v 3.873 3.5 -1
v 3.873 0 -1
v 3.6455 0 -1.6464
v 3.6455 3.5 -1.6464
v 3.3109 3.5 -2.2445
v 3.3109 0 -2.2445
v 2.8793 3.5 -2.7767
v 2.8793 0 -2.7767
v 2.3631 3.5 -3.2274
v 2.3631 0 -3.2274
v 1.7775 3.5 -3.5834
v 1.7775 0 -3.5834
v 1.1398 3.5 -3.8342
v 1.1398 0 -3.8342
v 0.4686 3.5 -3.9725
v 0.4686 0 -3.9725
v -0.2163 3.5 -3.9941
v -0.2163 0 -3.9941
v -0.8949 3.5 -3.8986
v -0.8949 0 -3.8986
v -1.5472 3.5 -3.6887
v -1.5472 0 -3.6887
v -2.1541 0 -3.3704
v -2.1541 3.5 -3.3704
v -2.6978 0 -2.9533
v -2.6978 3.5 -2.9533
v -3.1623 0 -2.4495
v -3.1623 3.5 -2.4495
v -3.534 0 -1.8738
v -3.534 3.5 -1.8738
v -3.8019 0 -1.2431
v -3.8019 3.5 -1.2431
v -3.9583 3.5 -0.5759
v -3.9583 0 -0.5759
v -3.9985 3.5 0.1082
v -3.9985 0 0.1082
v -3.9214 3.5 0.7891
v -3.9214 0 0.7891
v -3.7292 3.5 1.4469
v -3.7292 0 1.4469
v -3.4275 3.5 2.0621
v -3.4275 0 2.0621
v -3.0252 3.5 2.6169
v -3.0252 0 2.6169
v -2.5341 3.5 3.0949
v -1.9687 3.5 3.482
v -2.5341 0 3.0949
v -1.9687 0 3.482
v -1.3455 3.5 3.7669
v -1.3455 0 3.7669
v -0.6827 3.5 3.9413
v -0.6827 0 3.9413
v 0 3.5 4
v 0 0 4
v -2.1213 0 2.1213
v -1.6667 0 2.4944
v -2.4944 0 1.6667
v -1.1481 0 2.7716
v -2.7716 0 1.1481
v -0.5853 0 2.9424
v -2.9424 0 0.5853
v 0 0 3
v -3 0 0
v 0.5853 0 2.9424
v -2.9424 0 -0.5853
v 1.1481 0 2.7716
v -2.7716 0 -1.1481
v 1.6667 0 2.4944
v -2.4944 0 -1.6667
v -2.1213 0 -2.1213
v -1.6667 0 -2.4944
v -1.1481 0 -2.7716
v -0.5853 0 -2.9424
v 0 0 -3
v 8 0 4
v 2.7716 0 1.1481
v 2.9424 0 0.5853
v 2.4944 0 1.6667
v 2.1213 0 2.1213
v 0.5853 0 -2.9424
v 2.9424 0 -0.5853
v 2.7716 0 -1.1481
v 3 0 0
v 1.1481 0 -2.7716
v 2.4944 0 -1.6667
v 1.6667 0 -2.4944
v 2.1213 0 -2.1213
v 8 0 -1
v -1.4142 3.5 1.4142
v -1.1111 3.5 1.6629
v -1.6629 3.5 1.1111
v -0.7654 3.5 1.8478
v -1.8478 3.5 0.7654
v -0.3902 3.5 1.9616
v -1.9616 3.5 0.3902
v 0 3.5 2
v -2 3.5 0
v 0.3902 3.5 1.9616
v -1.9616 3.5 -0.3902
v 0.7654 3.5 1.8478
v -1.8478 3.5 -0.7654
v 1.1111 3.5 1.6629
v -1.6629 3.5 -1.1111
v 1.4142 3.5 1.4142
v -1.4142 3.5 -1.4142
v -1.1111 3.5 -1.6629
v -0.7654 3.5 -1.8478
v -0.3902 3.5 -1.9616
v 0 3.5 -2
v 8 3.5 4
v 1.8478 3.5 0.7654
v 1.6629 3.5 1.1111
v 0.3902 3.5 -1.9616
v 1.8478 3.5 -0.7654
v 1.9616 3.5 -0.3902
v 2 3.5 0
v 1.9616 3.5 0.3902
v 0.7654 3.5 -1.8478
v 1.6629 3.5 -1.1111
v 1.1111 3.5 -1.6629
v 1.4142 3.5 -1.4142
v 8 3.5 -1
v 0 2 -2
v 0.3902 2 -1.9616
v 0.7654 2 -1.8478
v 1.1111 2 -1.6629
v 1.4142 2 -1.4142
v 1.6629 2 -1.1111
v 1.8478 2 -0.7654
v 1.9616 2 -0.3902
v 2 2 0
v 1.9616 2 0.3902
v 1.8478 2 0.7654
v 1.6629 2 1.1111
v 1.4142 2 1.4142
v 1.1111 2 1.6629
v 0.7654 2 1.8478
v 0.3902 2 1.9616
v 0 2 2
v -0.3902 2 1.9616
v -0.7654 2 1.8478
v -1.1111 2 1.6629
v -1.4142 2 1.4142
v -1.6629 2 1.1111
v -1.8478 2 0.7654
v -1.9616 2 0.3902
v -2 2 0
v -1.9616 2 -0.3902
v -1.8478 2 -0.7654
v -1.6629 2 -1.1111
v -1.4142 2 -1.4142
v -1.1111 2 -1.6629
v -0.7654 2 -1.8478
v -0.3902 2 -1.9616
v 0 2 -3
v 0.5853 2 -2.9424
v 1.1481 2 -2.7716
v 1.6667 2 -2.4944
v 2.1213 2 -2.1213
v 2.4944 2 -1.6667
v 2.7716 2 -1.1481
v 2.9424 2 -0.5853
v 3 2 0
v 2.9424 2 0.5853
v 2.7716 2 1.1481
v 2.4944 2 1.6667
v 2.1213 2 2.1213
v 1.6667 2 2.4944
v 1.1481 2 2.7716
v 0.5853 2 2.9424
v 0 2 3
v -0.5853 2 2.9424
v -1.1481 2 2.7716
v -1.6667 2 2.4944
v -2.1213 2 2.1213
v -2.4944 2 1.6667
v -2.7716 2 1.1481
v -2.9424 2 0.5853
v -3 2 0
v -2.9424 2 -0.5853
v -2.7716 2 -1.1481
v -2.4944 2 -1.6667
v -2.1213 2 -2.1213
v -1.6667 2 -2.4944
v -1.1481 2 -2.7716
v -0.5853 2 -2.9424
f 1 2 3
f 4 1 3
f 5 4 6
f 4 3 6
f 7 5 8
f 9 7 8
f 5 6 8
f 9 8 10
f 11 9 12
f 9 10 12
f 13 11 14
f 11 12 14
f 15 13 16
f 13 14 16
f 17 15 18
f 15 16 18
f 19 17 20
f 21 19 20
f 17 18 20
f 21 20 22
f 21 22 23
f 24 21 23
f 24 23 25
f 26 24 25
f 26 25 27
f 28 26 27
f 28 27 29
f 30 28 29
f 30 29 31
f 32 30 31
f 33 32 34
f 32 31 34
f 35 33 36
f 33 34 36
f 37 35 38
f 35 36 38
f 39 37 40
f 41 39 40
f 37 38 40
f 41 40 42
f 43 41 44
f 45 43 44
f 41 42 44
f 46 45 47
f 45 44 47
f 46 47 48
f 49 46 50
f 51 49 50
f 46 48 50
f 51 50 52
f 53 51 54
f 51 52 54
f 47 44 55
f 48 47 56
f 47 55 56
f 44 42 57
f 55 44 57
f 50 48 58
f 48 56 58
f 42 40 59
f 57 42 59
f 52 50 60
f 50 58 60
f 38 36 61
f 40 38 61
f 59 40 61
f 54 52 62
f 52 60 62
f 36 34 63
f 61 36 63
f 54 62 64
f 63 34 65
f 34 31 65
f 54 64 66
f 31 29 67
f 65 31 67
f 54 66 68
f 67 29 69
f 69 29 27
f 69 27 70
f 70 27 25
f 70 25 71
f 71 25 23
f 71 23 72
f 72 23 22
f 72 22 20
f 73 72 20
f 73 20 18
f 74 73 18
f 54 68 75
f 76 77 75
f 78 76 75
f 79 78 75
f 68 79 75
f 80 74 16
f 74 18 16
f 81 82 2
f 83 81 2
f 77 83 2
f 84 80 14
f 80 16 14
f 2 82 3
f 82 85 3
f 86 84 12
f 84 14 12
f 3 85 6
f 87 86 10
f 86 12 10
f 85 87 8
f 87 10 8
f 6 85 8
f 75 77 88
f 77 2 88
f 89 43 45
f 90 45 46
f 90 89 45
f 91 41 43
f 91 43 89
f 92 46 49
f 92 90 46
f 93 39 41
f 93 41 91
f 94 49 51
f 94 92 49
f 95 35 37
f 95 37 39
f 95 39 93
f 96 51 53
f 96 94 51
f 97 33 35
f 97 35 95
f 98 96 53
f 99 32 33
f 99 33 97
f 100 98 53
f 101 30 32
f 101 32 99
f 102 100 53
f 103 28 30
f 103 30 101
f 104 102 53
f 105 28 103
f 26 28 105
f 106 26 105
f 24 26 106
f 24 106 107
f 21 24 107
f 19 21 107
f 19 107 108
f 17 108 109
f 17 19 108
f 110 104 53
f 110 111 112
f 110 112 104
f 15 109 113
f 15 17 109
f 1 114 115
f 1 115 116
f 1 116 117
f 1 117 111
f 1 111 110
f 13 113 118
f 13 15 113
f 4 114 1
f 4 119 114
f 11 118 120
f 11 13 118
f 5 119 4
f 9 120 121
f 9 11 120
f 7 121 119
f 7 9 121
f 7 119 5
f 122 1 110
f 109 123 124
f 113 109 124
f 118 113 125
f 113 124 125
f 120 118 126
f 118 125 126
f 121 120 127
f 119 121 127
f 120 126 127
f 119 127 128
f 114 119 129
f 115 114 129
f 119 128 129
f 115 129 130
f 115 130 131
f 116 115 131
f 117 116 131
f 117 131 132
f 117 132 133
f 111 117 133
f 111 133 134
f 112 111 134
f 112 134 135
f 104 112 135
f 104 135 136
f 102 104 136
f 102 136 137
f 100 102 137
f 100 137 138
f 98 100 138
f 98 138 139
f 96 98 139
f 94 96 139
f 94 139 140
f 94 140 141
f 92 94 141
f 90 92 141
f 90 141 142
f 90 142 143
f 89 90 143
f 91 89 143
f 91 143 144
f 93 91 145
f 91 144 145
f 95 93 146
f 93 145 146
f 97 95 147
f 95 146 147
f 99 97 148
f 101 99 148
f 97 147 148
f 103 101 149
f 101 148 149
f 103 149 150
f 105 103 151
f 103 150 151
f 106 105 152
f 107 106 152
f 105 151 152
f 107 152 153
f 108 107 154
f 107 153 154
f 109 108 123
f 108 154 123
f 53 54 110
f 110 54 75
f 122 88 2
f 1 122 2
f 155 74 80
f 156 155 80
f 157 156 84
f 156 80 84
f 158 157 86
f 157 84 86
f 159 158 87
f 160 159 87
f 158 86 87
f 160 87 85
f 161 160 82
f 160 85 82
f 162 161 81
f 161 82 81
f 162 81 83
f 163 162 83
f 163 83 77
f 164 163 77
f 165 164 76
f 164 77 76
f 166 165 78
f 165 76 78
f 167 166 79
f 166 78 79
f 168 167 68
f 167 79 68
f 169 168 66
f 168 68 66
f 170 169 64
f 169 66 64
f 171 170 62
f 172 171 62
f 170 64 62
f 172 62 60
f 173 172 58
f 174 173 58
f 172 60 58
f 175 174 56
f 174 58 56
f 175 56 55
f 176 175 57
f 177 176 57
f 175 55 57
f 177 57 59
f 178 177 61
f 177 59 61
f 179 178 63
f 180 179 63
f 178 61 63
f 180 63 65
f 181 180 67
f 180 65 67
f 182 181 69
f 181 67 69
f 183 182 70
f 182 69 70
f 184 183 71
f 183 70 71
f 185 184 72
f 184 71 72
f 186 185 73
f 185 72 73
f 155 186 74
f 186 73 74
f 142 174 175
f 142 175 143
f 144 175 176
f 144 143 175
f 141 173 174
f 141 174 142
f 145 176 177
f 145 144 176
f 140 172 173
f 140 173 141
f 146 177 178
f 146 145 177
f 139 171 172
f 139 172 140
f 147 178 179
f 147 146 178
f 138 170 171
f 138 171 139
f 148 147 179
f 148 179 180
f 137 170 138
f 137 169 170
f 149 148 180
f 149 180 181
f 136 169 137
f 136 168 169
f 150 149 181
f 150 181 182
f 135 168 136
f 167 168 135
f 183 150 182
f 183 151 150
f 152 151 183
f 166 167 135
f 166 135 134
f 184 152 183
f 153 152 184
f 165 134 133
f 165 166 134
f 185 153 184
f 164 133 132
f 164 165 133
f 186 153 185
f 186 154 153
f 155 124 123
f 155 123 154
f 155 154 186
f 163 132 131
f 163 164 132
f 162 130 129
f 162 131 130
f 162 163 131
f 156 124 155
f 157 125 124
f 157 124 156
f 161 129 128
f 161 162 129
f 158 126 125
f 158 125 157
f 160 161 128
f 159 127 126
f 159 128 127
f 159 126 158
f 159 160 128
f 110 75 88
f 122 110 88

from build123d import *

# Parameters (mm, degrees)
BOSS_EXTRUDE1_DEPTH = 3.5
SKETCH2_R           = 3
CUT_EXTRUDE1_DEPTH  = 2
SKETCH3_R           = 2
CUT_EXTRUDE2_DEPTH  = 10.16515139


with BuildPart() as part:
    # Sketch1 → Boss-Extrude1 (new body)
    with BuildSketch(Plane(origin=(0, 0, 0), x_dir=(1, 0, 0), z_dir=(0, 1, 0))):
        with BuildLine():
            Line((0, -4), (8, -4))
            Line((8, -4), (8, 1))
            Line((8, 1), (3.872983346, 1))
            ThreePointArc((3.872983346, 1), (-3.16227766, 2.449489743), (0, -4))
        make_face()
    extrude(amount=BOSS_EXTRUDE1_DEPTH)

    # Sketch2 → Cut-Extrude1 (cut)
    with BuildSketch(Plane.XZ):
        with Locations(Location((0, 0, 0), (0, 0, 270))):
            Circle(SKETCH2_R)
    extrude(amount=-CUT_EXTRUDE1_DEPTH, mode=Mode.SUBTRACT)

    # Sketch3 → Cut-Extrude2 (cut, through all)
    with BuildSketch(Plane.XZ.offset(-2)):
        with Locations(Location((0, 0, 0), (0, 0, 270))):
            Circle(SKETCH3_R)
    extrude(amount=-CUT_EXTRUDE2_DEPTH, mode=Mode.SUBTRACT)


solid = part.part
